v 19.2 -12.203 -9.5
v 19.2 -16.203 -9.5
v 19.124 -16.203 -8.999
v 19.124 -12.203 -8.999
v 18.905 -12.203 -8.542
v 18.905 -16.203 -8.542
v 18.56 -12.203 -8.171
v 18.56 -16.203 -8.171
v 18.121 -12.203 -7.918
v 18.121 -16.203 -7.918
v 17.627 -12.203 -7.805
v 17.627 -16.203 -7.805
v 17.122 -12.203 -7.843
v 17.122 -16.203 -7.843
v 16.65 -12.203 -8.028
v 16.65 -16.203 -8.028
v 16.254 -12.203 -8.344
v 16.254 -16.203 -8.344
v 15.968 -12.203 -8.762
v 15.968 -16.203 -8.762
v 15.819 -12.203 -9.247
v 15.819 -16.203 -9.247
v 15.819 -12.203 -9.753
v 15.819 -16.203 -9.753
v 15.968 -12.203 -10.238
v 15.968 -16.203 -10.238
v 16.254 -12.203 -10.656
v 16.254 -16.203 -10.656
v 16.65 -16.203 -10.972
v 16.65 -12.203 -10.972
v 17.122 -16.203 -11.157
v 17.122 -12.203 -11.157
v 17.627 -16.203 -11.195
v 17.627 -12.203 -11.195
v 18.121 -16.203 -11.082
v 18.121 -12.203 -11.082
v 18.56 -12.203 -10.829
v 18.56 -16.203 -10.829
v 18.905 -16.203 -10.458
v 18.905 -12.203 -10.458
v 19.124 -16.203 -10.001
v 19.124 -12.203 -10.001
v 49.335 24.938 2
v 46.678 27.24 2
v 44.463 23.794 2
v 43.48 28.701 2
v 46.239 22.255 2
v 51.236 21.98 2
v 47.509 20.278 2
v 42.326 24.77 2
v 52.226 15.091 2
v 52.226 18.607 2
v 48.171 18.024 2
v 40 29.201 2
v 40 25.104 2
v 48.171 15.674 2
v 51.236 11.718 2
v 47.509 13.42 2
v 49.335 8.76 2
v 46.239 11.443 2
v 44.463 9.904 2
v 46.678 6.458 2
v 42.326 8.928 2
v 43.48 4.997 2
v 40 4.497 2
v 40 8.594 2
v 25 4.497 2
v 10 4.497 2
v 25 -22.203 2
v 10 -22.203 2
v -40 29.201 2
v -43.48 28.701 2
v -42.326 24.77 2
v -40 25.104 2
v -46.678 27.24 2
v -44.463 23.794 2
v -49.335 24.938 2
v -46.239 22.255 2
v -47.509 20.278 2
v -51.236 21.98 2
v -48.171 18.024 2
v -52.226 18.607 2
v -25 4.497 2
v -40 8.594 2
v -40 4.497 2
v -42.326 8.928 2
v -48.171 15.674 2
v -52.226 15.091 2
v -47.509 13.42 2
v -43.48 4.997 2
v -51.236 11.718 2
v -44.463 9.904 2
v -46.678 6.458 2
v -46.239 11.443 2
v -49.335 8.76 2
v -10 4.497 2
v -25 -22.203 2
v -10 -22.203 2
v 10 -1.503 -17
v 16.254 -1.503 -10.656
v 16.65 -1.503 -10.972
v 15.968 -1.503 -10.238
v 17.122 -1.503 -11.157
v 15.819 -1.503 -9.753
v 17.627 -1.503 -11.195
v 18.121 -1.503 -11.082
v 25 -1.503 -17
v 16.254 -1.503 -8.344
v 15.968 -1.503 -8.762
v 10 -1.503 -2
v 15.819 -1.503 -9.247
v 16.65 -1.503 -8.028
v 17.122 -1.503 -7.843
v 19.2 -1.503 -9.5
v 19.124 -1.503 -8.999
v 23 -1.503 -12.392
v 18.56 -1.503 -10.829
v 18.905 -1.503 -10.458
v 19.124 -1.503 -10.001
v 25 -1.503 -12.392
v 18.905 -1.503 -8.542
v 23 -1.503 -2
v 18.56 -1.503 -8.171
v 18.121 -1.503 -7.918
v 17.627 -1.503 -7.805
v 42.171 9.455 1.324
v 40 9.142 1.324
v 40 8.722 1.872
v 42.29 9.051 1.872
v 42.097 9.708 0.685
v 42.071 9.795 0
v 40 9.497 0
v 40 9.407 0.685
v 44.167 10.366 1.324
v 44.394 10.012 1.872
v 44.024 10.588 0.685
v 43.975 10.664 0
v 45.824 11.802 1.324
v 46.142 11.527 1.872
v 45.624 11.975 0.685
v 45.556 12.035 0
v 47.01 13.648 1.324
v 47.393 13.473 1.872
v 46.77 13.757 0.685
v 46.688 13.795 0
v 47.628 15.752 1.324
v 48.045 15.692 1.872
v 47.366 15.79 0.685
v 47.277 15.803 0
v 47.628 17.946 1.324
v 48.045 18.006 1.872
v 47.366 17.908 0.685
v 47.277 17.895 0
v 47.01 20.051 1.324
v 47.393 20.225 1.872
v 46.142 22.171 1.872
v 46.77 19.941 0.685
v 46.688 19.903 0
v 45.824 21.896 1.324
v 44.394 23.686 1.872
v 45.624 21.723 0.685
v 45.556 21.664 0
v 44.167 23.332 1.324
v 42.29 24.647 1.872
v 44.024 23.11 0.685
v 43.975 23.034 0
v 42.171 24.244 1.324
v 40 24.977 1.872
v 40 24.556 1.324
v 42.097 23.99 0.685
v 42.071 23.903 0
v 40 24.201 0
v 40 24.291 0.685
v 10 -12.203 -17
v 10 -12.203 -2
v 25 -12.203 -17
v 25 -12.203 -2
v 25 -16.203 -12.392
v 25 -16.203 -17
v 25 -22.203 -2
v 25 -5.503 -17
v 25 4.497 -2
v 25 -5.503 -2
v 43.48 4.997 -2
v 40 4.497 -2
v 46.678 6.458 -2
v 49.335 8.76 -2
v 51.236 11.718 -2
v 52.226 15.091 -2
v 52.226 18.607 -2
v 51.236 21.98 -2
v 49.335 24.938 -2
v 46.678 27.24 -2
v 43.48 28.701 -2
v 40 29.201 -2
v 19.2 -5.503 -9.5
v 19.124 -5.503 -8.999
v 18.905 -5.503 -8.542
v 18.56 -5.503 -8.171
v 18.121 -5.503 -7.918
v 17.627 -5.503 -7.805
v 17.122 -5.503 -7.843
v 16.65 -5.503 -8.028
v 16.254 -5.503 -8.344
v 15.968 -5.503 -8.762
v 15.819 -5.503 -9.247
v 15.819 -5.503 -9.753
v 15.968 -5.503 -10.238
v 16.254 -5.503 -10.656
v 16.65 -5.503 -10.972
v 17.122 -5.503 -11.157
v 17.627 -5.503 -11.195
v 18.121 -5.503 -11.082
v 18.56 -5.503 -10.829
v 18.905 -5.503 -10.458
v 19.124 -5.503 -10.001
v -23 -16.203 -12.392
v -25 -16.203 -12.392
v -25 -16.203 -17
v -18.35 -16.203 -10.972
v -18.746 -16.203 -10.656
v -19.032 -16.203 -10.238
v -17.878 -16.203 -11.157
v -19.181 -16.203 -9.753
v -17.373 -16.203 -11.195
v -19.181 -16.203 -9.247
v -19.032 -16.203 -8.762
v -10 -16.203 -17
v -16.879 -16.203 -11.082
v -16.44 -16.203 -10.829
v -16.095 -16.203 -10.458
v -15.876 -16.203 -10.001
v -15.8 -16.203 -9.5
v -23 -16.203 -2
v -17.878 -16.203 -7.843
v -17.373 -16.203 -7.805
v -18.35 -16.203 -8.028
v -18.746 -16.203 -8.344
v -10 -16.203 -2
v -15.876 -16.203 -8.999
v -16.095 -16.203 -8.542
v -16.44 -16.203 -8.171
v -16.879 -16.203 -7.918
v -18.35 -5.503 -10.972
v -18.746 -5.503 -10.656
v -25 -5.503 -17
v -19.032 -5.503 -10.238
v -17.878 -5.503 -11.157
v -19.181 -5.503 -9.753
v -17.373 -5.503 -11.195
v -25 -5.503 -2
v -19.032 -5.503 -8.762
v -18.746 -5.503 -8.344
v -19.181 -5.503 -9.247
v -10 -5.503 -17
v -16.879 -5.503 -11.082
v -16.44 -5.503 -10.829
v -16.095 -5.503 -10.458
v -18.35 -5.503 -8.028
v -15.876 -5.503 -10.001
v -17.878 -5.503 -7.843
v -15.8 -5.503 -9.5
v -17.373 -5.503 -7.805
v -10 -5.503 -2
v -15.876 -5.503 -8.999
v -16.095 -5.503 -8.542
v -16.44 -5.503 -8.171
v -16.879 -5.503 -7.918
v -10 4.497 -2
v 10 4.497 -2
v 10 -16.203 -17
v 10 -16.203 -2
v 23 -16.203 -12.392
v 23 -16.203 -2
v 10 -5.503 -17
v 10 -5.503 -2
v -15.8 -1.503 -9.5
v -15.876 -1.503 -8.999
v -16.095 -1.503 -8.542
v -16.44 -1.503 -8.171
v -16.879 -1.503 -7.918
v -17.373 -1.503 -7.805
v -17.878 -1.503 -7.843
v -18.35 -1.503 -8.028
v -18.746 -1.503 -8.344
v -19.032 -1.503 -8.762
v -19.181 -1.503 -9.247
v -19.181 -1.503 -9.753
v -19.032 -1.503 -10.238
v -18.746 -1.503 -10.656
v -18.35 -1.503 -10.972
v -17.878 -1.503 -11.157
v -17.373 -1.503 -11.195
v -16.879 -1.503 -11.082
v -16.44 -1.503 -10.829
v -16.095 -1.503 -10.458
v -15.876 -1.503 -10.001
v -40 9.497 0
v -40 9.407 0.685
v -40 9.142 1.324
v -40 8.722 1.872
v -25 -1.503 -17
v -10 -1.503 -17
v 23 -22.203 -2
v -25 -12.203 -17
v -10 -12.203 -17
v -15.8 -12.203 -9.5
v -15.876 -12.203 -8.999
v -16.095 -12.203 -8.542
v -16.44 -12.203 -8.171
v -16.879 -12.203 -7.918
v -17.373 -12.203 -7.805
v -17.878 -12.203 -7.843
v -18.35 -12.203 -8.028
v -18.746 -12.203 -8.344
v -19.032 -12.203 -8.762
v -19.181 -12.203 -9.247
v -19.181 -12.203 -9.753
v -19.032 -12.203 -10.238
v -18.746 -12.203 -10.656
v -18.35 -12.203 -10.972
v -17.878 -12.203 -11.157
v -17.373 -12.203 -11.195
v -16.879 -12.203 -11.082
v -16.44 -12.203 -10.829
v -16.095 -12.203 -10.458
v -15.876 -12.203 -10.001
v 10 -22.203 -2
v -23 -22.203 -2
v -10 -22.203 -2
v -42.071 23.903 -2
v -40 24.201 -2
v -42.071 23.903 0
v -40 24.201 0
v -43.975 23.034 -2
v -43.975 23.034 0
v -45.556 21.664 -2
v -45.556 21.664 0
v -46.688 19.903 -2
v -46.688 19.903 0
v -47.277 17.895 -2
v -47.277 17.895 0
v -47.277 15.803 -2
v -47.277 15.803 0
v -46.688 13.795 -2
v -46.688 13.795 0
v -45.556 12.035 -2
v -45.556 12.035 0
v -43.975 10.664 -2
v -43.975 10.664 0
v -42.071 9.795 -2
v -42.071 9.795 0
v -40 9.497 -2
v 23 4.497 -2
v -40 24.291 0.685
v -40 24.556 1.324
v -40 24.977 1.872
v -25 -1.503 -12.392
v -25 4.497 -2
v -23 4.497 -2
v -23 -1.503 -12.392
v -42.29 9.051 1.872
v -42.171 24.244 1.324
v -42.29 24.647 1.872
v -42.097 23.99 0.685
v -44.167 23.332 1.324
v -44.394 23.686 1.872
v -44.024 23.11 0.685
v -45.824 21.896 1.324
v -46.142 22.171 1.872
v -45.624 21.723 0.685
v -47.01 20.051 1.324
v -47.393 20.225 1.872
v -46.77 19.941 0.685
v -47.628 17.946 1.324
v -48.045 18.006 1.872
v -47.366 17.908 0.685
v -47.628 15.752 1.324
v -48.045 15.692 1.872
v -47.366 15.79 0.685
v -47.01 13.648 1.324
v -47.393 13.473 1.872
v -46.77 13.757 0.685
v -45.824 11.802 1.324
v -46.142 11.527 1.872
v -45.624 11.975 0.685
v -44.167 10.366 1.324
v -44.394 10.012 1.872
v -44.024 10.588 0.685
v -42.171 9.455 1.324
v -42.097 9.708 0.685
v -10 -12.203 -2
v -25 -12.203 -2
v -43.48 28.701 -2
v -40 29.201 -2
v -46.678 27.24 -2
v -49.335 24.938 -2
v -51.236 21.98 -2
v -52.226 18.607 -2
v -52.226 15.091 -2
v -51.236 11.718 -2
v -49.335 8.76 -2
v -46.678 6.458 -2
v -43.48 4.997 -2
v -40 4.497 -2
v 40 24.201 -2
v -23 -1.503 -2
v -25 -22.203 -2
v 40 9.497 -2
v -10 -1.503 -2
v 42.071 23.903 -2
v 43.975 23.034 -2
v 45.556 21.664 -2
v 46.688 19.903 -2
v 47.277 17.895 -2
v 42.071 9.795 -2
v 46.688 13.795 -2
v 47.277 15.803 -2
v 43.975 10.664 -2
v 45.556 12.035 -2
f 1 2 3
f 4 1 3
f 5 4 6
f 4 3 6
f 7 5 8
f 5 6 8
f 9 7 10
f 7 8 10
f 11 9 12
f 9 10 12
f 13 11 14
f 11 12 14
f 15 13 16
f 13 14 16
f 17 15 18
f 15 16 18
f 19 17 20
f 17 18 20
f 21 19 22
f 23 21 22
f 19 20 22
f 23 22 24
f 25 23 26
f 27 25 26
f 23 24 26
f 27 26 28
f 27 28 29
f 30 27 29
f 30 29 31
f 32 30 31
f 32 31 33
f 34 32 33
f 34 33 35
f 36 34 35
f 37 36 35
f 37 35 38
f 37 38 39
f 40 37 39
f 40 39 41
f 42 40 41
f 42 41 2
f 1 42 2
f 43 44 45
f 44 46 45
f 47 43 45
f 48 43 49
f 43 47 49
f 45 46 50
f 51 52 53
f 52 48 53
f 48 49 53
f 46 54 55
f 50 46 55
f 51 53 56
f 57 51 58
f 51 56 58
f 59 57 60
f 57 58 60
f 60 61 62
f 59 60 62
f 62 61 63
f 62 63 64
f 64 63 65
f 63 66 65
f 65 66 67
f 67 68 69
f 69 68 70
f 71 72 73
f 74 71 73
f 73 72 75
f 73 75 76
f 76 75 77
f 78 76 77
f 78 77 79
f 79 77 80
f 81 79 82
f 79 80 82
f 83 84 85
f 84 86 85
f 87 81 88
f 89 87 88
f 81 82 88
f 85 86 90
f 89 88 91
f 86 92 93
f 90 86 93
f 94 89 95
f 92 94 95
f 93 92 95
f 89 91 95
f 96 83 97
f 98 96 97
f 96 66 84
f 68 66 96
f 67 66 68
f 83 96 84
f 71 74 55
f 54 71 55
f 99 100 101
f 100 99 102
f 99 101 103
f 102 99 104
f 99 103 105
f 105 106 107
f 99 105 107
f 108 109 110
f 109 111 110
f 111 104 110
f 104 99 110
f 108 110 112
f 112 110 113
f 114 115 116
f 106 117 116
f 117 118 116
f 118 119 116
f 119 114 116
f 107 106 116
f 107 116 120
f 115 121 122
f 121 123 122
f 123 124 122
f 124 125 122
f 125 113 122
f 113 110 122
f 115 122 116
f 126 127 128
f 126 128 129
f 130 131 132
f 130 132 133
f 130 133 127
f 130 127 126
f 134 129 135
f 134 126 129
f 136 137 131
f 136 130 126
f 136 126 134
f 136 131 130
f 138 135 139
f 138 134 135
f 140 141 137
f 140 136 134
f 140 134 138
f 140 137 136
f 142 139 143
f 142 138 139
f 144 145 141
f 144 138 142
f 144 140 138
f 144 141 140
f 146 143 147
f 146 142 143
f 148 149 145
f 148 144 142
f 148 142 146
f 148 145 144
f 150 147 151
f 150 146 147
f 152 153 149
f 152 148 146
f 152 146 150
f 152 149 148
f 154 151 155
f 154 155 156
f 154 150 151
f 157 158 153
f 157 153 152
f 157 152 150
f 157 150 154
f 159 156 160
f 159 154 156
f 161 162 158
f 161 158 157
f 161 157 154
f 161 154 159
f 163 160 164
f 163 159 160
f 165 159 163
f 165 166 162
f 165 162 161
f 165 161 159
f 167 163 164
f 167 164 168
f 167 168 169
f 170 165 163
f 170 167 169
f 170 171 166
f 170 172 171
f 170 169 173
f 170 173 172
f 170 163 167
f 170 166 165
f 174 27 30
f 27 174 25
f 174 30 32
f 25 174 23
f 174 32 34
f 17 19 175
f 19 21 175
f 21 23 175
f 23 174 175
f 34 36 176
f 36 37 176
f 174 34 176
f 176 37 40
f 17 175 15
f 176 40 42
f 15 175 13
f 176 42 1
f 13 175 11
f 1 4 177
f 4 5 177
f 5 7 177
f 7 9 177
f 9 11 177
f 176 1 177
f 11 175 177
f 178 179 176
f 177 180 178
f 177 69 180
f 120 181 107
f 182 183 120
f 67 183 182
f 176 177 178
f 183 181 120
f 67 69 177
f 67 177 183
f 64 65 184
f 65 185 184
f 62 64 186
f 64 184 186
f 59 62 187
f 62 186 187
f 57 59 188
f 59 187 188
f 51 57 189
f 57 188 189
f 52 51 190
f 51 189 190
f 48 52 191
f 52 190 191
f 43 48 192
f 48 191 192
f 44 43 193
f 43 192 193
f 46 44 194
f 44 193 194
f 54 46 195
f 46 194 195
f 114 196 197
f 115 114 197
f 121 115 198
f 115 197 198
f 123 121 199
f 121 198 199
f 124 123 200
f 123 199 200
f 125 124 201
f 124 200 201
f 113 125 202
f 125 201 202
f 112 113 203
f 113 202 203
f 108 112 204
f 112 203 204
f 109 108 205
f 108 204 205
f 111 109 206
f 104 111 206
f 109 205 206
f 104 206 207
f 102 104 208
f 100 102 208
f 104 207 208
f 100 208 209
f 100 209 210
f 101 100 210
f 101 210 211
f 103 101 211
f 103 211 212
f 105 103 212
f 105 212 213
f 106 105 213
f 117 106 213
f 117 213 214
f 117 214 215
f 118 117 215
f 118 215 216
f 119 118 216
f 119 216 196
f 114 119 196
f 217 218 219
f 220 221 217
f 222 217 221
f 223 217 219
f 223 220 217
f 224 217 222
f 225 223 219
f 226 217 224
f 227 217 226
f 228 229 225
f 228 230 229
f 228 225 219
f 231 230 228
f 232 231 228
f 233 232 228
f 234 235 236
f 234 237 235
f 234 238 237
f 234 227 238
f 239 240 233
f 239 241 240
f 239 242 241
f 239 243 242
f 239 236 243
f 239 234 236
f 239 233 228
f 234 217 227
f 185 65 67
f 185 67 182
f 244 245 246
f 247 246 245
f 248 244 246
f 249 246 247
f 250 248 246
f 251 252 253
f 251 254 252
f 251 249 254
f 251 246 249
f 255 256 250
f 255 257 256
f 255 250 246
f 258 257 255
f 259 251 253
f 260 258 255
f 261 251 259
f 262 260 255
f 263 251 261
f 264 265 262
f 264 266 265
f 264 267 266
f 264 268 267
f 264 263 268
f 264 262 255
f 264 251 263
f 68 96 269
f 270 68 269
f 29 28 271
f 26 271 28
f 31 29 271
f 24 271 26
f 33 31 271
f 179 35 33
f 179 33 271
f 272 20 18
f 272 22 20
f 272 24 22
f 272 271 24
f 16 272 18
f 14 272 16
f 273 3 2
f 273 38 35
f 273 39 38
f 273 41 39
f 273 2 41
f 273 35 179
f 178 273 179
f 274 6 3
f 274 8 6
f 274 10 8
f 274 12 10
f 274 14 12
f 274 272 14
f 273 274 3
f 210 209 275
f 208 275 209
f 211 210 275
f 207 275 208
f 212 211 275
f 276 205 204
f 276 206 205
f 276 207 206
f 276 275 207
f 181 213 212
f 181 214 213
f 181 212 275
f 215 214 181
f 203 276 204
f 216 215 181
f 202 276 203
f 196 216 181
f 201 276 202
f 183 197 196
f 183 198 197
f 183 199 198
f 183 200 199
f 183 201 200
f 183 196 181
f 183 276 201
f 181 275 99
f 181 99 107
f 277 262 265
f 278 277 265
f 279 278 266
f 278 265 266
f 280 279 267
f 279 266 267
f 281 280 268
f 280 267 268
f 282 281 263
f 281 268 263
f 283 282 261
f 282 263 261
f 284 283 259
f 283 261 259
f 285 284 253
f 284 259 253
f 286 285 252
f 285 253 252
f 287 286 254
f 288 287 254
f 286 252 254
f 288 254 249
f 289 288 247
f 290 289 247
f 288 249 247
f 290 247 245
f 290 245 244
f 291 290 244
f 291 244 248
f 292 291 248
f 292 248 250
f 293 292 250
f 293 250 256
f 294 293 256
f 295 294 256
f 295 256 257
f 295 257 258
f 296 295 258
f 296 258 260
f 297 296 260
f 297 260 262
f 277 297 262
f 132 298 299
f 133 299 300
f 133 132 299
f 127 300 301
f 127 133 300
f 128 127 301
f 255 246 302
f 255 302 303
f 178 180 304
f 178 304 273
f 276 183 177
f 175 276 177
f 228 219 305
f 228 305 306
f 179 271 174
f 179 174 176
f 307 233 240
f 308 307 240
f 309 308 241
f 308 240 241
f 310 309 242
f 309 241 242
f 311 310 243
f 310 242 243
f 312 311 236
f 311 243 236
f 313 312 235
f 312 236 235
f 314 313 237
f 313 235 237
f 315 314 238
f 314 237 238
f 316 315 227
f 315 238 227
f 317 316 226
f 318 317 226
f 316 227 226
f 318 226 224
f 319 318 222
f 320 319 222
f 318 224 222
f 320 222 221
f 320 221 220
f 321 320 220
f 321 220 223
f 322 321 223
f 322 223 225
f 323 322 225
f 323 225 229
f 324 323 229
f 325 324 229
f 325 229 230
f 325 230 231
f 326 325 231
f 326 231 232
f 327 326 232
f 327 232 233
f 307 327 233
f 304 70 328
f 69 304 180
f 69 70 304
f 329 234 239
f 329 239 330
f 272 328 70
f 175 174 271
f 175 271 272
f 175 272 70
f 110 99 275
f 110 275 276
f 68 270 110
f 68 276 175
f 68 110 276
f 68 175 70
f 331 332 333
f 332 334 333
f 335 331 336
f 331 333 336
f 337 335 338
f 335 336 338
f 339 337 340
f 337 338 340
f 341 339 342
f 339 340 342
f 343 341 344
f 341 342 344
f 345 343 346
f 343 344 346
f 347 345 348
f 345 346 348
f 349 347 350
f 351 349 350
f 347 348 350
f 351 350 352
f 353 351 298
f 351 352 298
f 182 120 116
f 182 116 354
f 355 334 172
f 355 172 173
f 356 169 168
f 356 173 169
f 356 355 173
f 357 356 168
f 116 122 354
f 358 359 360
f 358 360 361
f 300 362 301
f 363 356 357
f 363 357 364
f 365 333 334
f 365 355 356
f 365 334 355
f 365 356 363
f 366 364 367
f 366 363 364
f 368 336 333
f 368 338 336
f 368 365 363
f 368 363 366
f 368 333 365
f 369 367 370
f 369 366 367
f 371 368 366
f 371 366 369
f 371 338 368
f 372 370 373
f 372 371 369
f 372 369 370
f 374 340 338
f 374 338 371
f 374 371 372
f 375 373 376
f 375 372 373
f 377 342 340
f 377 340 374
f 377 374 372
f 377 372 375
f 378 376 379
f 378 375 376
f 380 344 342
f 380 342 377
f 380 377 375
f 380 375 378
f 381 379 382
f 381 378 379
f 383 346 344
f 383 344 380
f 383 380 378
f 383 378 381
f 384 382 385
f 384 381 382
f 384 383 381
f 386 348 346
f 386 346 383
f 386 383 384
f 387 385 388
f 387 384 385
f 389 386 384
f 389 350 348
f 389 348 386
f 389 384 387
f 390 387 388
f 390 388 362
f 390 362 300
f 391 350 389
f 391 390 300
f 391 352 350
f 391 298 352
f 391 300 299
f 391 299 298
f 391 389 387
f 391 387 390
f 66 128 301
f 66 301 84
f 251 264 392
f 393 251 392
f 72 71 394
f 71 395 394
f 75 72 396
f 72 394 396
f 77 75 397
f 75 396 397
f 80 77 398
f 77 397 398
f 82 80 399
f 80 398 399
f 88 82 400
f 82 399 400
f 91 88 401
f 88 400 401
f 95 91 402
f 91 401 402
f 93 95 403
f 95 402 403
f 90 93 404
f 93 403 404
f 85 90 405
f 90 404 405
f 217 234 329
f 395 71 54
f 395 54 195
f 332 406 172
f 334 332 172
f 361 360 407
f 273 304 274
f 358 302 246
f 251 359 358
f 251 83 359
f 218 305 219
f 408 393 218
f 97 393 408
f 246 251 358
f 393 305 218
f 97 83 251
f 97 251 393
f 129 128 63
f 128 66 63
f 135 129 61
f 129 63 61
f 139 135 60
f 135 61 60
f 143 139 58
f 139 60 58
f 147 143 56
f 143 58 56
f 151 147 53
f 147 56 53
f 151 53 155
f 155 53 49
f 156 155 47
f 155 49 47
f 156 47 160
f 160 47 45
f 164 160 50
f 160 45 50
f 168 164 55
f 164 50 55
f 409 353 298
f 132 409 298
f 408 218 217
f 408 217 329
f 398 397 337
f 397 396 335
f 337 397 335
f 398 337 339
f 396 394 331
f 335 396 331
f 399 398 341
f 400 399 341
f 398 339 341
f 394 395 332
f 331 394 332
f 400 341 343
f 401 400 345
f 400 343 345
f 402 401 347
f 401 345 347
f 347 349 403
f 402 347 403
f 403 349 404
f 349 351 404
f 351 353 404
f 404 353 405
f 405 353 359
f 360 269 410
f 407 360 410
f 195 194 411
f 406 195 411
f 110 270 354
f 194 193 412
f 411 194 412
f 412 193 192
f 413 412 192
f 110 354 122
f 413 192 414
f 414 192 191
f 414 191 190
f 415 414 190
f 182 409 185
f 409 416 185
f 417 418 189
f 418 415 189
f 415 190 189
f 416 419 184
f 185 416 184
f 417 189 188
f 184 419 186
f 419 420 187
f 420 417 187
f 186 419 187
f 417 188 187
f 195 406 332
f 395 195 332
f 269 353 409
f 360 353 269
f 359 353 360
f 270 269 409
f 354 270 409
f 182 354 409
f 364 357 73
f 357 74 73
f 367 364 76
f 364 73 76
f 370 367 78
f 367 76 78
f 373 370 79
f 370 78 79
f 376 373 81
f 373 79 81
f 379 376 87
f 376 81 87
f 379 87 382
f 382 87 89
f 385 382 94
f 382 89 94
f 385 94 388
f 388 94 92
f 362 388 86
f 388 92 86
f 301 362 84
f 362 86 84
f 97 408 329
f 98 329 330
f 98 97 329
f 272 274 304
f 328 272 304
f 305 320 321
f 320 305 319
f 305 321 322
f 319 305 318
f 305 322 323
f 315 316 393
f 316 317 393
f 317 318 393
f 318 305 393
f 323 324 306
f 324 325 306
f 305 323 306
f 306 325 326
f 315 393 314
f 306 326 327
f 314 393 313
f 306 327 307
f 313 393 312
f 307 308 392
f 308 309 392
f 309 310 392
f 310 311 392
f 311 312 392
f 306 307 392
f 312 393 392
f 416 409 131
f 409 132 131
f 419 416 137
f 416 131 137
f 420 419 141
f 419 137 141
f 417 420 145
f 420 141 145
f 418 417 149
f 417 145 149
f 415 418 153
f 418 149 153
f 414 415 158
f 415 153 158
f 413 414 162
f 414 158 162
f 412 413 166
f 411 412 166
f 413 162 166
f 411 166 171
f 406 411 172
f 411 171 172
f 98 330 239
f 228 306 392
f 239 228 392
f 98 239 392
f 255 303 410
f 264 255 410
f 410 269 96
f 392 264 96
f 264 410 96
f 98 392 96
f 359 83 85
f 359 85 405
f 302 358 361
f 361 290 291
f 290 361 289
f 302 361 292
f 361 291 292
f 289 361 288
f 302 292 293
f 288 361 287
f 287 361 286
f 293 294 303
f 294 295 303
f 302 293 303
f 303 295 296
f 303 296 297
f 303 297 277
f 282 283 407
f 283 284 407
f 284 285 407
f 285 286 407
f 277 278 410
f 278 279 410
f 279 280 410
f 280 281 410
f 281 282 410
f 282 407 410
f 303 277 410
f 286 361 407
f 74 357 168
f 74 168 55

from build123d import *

# Parameters (mm, degrees)
F3_W      = 15
F3_H      = 4
F4_DEPTH  = 26.7
F5_W      = 15
F5_H      = 4
F6_DEPTH  = 15
F7_R      = 1.7
F8_DEPTH  = 45.4048897462
F10_DEPTH = 2
F12_DEPTH = 2


with BuildPart() as f2:
    # F2: sweep along a path in F0
    with BuildLine(Plane.XY) as f2_path:
        ThreePointArc((-40, 26.8490467115), (-50, 16.8490467115), (-40, 6.8490467115))
        Line((-40, 6.8490467115), (40, 6.8490467115))
        ThreePointArc((40, 6.8490467115), (50, 16.8490467115), (40, 26.8490467115))
        Line((40, 26.8490467115), (-40, 26.8490467115))
    # F1 (on Right) → F2 (sweep)
    with BuildSketch(Plane.YZ):
        with BuildLine():
            Line((4.4971018384, 2), (4.4971018384, -2))
            Line((4.4971018384, -2), (9.4971018384, -2))
            Line((9.4971018384, -2), (9.4971018384, 0))
            ThreePointArc((9.4971018384, 0), (9.2955306442, 1.013366825), (8.7215044486, 1.8724577372))
            Line((8.7215044486, 1.8724577372), (8.5939621858, 2))
            Line((8.5939621858, 2), (4.4971018384, 2))
        make_face()
    sweep(path=f2_path.line)

    # F3 (on face) → F4 (join)
    with BuildSketch(Plane.XZ.offset(-4.4971018384)):
        with Locations((-17.5, 0)):
            Rectangle(F3_W, F3_H)
        with Locations((17.5, 0)):
            Rectangle(F3_W, F3_H)
    extrude(amount=F4_DEPTH)

    # F5 (on face) → F6 (join)
    with BuildSketch(Plane(origin=(0, 0, -2), x_dir=(1, 0, 0), z_dir=(0, 0, -1))):
        with Locations((-17.5, 14.2028981616)):
            Rectangle(F5_W, F5_H)
        with Locations((-17.5, 3.5028981616)):
            Rectangle(F5_W, F5_H)
        with Locations((17.5, 14.2028981616)):
            Rectangle(F5_W, F5_H)
        with Locations((17.5, 3.5028981616)):
            Rectangle(F5_W, F5_H)
    extrude(amount=F6_DEPTH)

    # F7 (on face) → F8 (cut, through all)
    with BuildSketch(Plane.XZ.offset(16.2028981616)):
        with Locations((-17.5, -9.5)):
            Circle(F7_R)
        with Locations((17.5, -9.5)):
            Circle(F7_R)
    extrude(amount=-F8_DEPTH, mode=Mode.SUBTRACT)

    # F9 (on face) → F10 (join)
    with BuildSketch(Plane(origin=(-25, 0, 0), x_dir=(0, -1, 0), z_dir=(-1, 0, 0))):
        Polygon((1.5028981616, -12.3923048454), (1.5028981616, -2), (-4.4971018384, -2), align=None)
        Polygon((22.2028981616, -2), (16.2028981616, -2), (16.2028981616, -12.3923048454), align=None)
    extrude(amount=-F10_DEPTH)

    # F11 (on face) → F12 (join)
    with BuildSketch(Plane.YZ.offset(25)):
        Polygon((-16.2028981616, -12.3923048454), (-16.2028981616, -2), (-22.2028981616, -2), align=None)
        Polygon((-1.5028981616, -12.3923048454), (4.4971018384, -2), (-1.5028981616, -2), align=None)
    extrude(amount=-F12_DEPTH)


solid = f2.part
